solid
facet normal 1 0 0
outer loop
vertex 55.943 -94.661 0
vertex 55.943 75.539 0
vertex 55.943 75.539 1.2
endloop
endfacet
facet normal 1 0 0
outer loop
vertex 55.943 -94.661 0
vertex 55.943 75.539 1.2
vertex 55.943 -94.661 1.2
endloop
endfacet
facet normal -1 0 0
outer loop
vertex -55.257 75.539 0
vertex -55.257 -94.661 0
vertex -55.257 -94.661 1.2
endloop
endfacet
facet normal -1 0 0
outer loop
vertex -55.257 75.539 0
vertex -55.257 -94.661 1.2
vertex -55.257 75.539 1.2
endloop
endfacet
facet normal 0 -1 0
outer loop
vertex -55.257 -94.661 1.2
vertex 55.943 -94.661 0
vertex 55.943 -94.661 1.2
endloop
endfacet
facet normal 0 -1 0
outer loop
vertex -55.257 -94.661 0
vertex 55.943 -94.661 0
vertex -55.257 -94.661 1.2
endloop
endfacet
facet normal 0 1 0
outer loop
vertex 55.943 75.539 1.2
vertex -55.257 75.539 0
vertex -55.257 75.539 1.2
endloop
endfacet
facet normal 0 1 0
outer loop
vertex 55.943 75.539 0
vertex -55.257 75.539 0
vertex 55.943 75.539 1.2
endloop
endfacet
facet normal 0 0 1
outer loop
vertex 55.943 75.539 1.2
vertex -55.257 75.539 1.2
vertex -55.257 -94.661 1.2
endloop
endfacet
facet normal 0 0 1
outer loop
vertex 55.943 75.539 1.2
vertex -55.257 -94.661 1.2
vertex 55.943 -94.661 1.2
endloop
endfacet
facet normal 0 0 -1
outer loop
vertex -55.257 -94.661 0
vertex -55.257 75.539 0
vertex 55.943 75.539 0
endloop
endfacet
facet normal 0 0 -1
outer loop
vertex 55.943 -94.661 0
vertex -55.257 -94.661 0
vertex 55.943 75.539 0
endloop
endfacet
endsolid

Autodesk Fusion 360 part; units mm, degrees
sketch "Sketch1" plane through (0, 0, 0) normal (0, 0, 1) x (1, 0, 0)
  line L0 (-55.2571, 75.5392) -> (55.9429, 75.5392)
  line L1 (55.9429, 75.5392) -> (55.9429, -94.6608)
  line L2 (55.9429, -94.6608) -> (-55.2571, -94.6608)
  line L3 (-55.2571, -94.6608) -> (-55.2571, 75.5392)
  dimension "d1" = 111.2
  dimension "d2" = 170.2
extrude "Extrude1" add sketch "Sketch1" along normal blind 1.2 makes body 1
sketch "Sketch2" plane through (0, 0, 1.2) normal (0, 0, 1) x (-1, 0, 0)
  line L0 (55.2571, 94.6608) -> (-55.9429, 94.6608)
  line L1 (-55.9429, 94.6608) -> (-55.9429, -75.5392)
  line L2 (-55.9429, -75.5392) -> (55.2571, -75.5392)
  line L3 (55.2571, -75.5392) -> (55.2571, 94.6608)
sketch "Sketch3" plane through (0, 0, 1.2) normal (0, 0, 1) x (-1, 0, 0)
  line L0 (51.7571, -72.0392) -> (-46.1629, -72.0392)
  line L1 (-46.1629, -72.0392) -> (-46.1629, 91.1608)
  line L2 (-46.1629, 91.1608) -> (51.7571, 91.1608)
  line L3 (51.7571, 91.1608) -> (51.7571, -72.0392)
  line L4 (55.2571, -75.5392) -> (55.2571, 94.6608)
  line L5 (-55.9429, -75.5392) -> (55.2571, -75.5392)
  dimension "d8" = 97.92
  dimension "d9" = 163.2
  dimension "d10" = 3.5
  dimension "d11" = 3.5
sketch "Sketch5" plane through (0, 0, 0) normal (0, 0, 1) x (1, 0, 0)
  line L0 (-52.5571, 72.8392) -> (51.5329, 72.8392)
  line L1 (51.5329, -91.9608) -> (-52.5571, -91.9608)
  line L2 (-52.5571, -91.9608) -> (-52.5571, 72.8392)
  line L3 (-55.2571, 75.5392) -> (-55.2571, -94.6608)
  line L4 (55.9429, 75.5392) -> (-55.2571, 75.5392)
  line L5 (51.5329, 72.8392) -> (51.5329, 66.8392)
  line L6 (51.5329, -91.9608) -> (51.5329, -85.9608)
  line L7 (51.5329, -85.9608) -> (48.5329, -85.9608)
  line L8 (51.5329, 66.8392) -> (48.5329, 66.8392)
  line L9 (46.5329, 64.8392) -> (46.5329, -83.9608)
  arc A0 (46.5329, -83.9608) -> (48.5329, -85.9608) centre (48.5329, -83.9608) ccw
  arc A1 (48.5329, 66.8392) -> (46.5329, 64.8392) centre (48.5329, 64.8392) ccw
  line L10 (-55.2571, -94.6608) -> (55.9429, -94.6608)
  point P0 (46.5329, -85.9608)
  point P1 (46.5329, 66.8392)
  dimension "d14" = 164.8
  dimension "d15" = 104.09
  dimension "d16" = 2.7
  dimension "d17" = 2.7
  dimension "d19" = 6
  dimension "d21" = 6
  dimension "d22" = 5
  dimension "d23" = 5
  dimension "d24" = 2
sketch "Sketch12" plane through (0, 0, 0) normal (0, 0, 1) x (1, 0, 0)
  line L0 (-54.0571, 74.3392) -> (53.0329, 74.3392)
  line L1 (53.0329, -93.4608) -> (-54.0571, -93.4608)
  line L2 (-54.0571, -93.4608) -> (-54.0571, 74.3392)
  line L3 (-55.2571, -94.6608) -> (-55.2571, 75.5392)
  line L4 (-55.2571, 75.5392) -> (55.9429, 75.5392)
  line L5 (53.0329, 74.3392) -> (53.0329, 65.3392)
  line L6 (53.0329, 65.3392) -> (50.0329, 65.3392)
  line L7 (53.0329, -93.4608) -> (53.0329, -84.4608)
  line L8 (53.0329, -84.4608) -> (50.0329, -84.4608)
  line L9 (48.0329, -82.4608) -> (48.0329, 63.3392)
  arc A0 (50.0329, 65.3392) -> (48.0329, 63.3392) centre (50.0329, 63.3392) ccw
  arc A1 (48.0329, -82.4608) -> (50.0329, -84.4608) centre (50.0329, -82.4608) ccw
  point P0 (48.0329, 65.3392)
  point P1 (48.0329, -84.4608)
  dimension "d32" = 107.09
  dimension "d33" = 167.8
  dimension "d34" = 1.2
  dimension "d35" = 1.2
  dimension "d40" = 9
  dimension "d42" = 5
  dimension "d43" = 9
  dimension "d44" = 5
  dimension "d45" = 107.09
  dimension "d46" = 2
  dimension "d47" = 2
copy_body "Body->Comp1" bodies 1 removing the originals makes body 2 in component "Component"
component "Component" placed x (1, 0, 0) y (0, 1, 0) z (0, 0, 1) at (0, 0, 0)
